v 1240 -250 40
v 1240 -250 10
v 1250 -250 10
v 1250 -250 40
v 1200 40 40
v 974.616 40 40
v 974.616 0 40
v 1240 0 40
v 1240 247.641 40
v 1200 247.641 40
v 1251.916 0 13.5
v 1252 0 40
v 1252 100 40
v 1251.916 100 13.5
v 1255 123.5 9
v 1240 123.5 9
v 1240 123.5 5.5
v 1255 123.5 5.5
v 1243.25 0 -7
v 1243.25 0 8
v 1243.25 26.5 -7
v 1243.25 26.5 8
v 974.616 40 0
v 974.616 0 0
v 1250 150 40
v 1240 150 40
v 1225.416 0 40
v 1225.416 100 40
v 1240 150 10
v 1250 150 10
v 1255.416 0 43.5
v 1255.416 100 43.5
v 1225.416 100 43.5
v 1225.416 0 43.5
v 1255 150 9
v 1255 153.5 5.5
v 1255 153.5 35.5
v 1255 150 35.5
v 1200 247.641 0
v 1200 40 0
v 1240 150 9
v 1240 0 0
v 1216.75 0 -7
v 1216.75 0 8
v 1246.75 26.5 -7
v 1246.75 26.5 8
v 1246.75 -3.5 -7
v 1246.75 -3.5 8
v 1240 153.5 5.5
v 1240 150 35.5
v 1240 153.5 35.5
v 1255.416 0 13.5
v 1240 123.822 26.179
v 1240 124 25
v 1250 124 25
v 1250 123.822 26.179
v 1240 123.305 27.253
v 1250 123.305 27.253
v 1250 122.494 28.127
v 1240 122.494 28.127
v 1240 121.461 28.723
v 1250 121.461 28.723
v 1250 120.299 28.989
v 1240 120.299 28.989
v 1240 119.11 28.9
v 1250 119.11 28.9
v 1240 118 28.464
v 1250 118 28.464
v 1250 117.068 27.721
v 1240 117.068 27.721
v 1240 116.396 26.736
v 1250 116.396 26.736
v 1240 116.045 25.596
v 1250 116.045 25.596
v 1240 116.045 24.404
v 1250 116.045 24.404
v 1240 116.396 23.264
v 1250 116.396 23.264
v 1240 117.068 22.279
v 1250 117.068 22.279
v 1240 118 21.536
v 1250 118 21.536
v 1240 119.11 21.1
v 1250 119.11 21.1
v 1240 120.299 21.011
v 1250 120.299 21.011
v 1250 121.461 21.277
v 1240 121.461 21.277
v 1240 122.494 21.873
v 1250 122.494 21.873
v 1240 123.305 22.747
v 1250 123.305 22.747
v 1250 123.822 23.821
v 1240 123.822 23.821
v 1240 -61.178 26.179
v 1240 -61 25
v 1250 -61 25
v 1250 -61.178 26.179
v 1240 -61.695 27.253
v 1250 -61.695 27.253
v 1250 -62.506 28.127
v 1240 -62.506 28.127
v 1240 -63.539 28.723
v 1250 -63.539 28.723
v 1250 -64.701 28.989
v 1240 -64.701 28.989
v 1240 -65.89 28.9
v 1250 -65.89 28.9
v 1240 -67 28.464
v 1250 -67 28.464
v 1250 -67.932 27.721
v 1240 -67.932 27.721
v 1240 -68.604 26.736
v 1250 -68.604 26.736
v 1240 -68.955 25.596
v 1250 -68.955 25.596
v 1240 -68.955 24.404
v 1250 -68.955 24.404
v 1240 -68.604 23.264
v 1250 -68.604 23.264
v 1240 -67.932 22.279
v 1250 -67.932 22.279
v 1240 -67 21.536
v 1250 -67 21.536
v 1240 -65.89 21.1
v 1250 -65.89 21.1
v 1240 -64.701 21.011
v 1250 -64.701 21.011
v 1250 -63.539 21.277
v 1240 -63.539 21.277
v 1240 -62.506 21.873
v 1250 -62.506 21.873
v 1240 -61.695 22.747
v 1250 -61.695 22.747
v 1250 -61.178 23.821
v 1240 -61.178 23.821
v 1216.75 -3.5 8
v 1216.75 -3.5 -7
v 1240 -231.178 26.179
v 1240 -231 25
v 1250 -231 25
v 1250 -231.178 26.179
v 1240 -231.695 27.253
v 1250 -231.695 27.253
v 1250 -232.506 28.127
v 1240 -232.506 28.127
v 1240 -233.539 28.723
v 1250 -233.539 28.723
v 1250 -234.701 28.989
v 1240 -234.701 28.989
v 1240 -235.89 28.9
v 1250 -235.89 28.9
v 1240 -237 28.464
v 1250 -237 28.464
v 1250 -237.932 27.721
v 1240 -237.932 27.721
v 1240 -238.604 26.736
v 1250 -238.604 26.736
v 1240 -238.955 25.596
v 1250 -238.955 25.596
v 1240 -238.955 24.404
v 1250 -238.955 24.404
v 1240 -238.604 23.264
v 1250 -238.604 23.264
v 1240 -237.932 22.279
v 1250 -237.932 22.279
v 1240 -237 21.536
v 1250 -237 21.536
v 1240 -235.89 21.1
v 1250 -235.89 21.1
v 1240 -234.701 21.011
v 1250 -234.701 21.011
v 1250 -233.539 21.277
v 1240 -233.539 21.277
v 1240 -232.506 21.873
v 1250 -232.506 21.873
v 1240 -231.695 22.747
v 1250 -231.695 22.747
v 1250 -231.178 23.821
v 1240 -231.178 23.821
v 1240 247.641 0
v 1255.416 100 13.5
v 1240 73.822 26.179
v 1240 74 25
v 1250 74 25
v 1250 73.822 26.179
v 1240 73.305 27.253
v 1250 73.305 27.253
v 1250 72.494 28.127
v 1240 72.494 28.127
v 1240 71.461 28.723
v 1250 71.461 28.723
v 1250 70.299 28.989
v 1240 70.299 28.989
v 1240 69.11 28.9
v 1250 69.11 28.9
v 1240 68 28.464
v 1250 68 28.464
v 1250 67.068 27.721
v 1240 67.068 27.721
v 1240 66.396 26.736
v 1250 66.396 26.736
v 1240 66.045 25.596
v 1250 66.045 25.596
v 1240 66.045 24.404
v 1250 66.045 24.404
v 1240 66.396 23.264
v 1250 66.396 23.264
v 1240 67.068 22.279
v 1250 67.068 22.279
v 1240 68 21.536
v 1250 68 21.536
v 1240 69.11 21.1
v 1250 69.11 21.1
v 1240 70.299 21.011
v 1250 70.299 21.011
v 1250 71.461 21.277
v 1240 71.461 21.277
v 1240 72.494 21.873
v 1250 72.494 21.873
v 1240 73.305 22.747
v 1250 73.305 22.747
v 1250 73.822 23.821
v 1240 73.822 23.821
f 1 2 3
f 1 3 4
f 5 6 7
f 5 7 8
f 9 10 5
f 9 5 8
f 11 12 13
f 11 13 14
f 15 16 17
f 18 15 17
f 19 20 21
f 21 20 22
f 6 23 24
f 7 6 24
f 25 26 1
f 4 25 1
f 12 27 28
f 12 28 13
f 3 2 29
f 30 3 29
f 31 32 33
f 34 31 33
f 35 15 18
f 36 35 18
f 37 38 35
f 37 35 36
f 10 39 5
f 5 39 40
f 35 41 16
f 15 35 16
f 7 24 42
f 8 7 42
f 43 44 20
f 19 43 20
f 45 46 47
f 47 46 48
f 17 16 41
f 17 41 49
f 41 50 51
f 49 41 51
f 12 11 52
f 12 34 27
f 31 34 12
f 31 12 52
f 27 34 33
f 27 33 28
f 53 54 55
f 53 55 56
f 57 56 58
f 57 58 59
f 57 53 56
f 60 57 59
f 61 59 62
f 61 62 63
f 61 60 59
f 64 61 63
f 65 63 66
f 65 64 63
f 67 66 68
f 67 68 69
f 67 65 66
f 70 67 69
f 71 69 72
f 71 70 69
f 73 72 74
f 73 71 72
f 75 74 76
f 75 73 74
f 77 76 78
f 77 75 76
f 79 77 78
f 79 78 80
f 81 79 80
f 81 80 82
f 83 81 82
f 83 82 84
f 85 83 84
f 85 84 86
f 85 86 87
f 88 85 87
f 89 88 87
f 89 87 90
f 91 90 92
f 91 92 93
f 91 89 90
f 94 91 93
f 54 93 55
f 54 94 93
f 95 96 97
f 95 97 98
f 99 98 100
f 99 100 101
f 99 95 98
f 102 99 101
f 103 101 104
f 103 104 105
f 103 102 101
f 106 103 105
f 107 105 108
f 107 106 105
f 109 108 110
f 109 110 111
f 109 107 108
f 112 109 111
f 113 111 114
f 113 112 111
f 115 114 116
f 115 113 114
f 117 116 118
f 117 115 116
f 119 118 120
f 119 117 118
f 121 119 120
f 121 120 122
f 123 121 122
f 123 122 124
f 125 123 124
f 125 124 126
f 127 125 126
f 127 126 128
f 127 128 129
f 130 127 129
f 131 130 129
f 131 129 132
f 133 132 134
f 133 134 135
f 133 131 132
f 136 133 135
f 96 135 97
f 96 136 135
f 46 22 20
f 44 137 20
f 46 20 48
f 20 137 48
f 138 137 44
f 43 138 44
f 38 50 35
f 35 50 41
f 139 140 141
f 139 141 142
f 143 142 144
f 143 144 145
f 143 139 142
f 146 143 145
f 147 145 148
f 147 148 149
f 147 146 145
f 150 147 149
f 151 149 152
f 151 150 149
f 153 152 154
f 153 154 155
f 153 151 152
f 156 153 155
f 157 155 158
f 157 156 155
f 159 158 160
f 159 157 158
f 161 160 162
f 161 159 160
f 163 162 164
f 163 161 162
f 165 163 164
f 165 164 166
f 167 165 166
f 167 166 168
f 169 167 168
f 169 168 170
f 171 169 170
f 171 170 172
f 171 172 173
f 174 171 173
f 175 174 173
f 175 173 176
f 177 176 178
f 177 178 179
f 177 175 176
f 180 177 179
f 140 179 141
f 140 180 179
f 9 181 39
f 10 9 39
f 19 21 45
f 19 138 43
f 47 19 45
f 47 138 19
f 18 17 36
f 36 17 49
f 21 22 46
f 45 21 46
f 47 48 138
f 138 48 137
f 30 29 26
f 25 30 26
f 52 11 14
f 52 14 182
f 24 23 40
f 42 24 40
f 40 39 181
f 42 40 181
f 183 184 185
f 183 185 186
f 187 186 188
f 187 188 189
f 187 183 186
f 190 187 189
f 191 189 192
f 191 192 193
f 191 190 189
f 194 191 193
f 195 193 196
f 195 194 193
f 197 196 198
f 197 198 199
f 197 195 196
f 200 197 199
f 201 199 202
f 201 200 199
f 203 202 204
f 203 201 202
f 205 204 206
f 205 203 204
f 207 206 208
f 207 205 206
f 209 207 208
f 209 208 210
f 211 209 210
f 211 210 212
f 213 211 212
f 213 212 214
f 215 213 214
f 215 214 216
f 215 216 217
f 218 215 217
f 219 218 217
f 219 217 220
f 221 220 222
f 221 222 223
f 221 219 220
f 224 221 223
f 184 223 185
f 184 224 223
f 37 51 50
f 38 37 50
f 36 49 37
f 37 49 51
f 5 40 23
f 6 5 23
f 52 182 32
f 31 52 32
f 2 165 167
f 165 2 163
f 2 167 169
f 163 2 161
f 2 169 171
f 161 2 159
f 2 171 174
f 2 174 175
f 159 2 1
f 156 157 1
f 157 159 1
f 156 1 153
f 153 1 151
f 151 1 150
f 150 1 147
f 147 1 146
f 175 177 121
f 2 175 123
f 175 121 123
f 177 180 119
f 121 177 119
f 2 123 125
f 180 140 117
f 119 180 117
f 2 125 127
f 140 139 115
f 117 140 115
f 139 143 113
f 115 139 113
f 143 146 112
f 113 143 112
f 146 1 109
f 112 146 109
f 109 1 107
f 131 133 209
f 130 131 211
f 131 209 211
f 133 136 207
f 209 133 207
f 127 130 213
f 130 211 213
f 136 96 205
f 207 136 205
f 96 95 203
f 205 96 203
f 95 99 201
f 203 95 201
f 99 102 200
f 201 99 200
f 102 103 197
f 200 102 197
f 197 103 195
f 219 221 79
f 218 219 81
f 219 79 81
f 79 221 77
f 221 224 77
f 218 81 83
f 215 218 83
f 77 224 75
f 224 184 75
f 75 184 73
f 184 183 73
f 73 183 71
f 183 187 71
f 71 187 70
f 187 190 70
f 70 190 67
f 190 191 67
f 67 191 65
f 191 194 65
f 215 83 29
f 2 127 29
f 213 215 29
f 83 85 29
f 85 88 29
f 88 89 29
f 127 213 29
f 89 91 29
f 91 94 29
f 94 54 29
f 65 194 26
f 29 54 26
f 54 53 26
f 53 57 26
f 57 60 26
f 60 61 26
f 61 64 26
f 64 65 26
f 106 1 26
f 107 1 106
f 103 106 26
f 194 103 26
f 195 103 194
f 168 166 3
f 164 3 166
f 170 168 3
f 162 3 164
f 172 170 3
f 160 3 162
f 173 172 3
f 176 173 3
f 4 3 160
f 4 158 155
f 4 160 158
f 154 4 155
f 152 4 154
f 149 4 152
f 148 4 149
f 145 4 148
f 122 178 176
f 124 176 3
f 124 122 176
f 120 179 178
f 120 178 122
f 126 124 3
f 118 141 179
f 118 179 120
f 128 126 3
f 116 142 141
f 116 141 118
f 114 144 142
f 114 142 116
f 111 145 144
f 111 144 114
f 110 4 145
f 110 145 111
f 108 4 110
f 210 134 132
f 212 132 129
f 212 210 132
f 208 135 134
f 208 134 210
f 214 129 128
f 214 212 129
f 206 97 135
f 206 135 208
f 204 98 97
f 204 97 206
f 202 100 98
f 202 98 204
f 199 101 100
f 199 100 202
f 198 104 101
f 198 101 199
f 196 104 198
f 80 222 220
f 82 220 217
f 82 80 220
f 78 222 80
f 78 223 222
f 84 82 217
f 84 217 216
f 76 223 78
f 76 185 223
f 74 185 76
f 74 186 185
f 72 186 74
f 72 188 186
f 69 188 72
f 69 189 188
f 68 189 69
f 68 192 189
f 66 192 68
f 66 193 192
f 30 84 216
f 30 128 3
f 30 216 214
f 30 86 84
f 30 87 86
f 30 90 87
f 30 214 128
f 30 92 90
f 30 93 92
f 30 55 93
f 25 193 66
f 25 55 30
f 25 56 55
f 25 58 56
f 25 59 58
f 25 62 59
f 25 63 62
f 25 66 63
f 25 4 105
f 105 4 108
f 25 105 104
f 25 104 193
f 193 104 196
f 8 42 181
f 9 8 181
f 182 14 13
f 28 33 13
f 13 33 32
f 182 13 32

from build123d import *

# Parameters (mm, degrees)
F1_DEPTH  = 40
F2_W      = 250
F2_H      = 30
F2_R      = 4
F2_W_2    = 150
F3_DEPTH  = 10
F5_DEPTH  = 100
F7_DEPTH  = 15
F10_DEPTH = 15


with BuildPart() as f1:
    # F0 (on Top) → F1 (new body)
    with BuildSketch(Plane.XY):
        Polygon((974.6156334877, 40), (974.6156334877, 0), (1240, 0), (1240, 247.6407289505), (1200, 247.6407289505), (1200, 40), align=None)
    extrude(amount=F1_DEPTH)


with BuildPart() as f3:
    # F2 (on face) → F3 (new body)
    with BuildSketch(Plane.YZ.offset(1240)):
        with Locations((-125, 25)):
            Rectangle(F2_W, F2_H)
        with Locations((-235, 25)):
            Circle(F2_R, mode=Mode.SUBTRACT)
        with Locations((-65, 25)):
            Circle(F2_R, mode=Mode.SUBTRACT)
        with Locations((75, 25)):
            Rectangle(F2_W_2, F2_H)
        with Locations((70, 25)):
            Circle(F2_R, mode=Mode.SUBTRACT)
        with Locations((120, 25)):
            Circle(F2_R, mode=Mode.SUBTRACT)
    extrude(amount=F3_DEPTH)


with BuildPart() as f5:
    # F4 (on face) → F5 (new body)
    with BuildSketch(Plane.XZ):
        Polygon((1240, 40), (1252, 40), (1251.9164218903, 13.5), (1255.4164218903, 13.5), (1255.4164218903, 43.5), (1225.4164218903, 43.5), (1225.4164218903, 40), align=None)
    extrude(amount=-F5_DEPTH)


with BuildPart() as f7:
    # F6 (on face) → F7 (new body)
    with BuildSketch(Plane.YZ.offset(1240)):
        Polygon((150, 35.5), (150, 10), (150, 9), (123.5, 9), (123.5, 5.5), (153.5, 5.5), (153.5, 35.5), align=None)
    extrude(amount=F7_DEPTH)


with BuildPart() as f10:
    # F9 (on offset) → F10 (new body)
    with BuildSketch(Plane(origin=(0, 0, 8), x_dir=(1, 0, 0), z_dir=(0, 0, -1))):
        Polygon((1243.25, -26.5), (1246.75, -26.5), (1246.75, 3.5), (1216.75, 3.5), (1216.75, 0), (1243.25, 0), align=None)
    extrude(amount=F10_DEPTH)


solid = Compound([f1.part, f3.part, f5.part, f7.part, f10.part])
